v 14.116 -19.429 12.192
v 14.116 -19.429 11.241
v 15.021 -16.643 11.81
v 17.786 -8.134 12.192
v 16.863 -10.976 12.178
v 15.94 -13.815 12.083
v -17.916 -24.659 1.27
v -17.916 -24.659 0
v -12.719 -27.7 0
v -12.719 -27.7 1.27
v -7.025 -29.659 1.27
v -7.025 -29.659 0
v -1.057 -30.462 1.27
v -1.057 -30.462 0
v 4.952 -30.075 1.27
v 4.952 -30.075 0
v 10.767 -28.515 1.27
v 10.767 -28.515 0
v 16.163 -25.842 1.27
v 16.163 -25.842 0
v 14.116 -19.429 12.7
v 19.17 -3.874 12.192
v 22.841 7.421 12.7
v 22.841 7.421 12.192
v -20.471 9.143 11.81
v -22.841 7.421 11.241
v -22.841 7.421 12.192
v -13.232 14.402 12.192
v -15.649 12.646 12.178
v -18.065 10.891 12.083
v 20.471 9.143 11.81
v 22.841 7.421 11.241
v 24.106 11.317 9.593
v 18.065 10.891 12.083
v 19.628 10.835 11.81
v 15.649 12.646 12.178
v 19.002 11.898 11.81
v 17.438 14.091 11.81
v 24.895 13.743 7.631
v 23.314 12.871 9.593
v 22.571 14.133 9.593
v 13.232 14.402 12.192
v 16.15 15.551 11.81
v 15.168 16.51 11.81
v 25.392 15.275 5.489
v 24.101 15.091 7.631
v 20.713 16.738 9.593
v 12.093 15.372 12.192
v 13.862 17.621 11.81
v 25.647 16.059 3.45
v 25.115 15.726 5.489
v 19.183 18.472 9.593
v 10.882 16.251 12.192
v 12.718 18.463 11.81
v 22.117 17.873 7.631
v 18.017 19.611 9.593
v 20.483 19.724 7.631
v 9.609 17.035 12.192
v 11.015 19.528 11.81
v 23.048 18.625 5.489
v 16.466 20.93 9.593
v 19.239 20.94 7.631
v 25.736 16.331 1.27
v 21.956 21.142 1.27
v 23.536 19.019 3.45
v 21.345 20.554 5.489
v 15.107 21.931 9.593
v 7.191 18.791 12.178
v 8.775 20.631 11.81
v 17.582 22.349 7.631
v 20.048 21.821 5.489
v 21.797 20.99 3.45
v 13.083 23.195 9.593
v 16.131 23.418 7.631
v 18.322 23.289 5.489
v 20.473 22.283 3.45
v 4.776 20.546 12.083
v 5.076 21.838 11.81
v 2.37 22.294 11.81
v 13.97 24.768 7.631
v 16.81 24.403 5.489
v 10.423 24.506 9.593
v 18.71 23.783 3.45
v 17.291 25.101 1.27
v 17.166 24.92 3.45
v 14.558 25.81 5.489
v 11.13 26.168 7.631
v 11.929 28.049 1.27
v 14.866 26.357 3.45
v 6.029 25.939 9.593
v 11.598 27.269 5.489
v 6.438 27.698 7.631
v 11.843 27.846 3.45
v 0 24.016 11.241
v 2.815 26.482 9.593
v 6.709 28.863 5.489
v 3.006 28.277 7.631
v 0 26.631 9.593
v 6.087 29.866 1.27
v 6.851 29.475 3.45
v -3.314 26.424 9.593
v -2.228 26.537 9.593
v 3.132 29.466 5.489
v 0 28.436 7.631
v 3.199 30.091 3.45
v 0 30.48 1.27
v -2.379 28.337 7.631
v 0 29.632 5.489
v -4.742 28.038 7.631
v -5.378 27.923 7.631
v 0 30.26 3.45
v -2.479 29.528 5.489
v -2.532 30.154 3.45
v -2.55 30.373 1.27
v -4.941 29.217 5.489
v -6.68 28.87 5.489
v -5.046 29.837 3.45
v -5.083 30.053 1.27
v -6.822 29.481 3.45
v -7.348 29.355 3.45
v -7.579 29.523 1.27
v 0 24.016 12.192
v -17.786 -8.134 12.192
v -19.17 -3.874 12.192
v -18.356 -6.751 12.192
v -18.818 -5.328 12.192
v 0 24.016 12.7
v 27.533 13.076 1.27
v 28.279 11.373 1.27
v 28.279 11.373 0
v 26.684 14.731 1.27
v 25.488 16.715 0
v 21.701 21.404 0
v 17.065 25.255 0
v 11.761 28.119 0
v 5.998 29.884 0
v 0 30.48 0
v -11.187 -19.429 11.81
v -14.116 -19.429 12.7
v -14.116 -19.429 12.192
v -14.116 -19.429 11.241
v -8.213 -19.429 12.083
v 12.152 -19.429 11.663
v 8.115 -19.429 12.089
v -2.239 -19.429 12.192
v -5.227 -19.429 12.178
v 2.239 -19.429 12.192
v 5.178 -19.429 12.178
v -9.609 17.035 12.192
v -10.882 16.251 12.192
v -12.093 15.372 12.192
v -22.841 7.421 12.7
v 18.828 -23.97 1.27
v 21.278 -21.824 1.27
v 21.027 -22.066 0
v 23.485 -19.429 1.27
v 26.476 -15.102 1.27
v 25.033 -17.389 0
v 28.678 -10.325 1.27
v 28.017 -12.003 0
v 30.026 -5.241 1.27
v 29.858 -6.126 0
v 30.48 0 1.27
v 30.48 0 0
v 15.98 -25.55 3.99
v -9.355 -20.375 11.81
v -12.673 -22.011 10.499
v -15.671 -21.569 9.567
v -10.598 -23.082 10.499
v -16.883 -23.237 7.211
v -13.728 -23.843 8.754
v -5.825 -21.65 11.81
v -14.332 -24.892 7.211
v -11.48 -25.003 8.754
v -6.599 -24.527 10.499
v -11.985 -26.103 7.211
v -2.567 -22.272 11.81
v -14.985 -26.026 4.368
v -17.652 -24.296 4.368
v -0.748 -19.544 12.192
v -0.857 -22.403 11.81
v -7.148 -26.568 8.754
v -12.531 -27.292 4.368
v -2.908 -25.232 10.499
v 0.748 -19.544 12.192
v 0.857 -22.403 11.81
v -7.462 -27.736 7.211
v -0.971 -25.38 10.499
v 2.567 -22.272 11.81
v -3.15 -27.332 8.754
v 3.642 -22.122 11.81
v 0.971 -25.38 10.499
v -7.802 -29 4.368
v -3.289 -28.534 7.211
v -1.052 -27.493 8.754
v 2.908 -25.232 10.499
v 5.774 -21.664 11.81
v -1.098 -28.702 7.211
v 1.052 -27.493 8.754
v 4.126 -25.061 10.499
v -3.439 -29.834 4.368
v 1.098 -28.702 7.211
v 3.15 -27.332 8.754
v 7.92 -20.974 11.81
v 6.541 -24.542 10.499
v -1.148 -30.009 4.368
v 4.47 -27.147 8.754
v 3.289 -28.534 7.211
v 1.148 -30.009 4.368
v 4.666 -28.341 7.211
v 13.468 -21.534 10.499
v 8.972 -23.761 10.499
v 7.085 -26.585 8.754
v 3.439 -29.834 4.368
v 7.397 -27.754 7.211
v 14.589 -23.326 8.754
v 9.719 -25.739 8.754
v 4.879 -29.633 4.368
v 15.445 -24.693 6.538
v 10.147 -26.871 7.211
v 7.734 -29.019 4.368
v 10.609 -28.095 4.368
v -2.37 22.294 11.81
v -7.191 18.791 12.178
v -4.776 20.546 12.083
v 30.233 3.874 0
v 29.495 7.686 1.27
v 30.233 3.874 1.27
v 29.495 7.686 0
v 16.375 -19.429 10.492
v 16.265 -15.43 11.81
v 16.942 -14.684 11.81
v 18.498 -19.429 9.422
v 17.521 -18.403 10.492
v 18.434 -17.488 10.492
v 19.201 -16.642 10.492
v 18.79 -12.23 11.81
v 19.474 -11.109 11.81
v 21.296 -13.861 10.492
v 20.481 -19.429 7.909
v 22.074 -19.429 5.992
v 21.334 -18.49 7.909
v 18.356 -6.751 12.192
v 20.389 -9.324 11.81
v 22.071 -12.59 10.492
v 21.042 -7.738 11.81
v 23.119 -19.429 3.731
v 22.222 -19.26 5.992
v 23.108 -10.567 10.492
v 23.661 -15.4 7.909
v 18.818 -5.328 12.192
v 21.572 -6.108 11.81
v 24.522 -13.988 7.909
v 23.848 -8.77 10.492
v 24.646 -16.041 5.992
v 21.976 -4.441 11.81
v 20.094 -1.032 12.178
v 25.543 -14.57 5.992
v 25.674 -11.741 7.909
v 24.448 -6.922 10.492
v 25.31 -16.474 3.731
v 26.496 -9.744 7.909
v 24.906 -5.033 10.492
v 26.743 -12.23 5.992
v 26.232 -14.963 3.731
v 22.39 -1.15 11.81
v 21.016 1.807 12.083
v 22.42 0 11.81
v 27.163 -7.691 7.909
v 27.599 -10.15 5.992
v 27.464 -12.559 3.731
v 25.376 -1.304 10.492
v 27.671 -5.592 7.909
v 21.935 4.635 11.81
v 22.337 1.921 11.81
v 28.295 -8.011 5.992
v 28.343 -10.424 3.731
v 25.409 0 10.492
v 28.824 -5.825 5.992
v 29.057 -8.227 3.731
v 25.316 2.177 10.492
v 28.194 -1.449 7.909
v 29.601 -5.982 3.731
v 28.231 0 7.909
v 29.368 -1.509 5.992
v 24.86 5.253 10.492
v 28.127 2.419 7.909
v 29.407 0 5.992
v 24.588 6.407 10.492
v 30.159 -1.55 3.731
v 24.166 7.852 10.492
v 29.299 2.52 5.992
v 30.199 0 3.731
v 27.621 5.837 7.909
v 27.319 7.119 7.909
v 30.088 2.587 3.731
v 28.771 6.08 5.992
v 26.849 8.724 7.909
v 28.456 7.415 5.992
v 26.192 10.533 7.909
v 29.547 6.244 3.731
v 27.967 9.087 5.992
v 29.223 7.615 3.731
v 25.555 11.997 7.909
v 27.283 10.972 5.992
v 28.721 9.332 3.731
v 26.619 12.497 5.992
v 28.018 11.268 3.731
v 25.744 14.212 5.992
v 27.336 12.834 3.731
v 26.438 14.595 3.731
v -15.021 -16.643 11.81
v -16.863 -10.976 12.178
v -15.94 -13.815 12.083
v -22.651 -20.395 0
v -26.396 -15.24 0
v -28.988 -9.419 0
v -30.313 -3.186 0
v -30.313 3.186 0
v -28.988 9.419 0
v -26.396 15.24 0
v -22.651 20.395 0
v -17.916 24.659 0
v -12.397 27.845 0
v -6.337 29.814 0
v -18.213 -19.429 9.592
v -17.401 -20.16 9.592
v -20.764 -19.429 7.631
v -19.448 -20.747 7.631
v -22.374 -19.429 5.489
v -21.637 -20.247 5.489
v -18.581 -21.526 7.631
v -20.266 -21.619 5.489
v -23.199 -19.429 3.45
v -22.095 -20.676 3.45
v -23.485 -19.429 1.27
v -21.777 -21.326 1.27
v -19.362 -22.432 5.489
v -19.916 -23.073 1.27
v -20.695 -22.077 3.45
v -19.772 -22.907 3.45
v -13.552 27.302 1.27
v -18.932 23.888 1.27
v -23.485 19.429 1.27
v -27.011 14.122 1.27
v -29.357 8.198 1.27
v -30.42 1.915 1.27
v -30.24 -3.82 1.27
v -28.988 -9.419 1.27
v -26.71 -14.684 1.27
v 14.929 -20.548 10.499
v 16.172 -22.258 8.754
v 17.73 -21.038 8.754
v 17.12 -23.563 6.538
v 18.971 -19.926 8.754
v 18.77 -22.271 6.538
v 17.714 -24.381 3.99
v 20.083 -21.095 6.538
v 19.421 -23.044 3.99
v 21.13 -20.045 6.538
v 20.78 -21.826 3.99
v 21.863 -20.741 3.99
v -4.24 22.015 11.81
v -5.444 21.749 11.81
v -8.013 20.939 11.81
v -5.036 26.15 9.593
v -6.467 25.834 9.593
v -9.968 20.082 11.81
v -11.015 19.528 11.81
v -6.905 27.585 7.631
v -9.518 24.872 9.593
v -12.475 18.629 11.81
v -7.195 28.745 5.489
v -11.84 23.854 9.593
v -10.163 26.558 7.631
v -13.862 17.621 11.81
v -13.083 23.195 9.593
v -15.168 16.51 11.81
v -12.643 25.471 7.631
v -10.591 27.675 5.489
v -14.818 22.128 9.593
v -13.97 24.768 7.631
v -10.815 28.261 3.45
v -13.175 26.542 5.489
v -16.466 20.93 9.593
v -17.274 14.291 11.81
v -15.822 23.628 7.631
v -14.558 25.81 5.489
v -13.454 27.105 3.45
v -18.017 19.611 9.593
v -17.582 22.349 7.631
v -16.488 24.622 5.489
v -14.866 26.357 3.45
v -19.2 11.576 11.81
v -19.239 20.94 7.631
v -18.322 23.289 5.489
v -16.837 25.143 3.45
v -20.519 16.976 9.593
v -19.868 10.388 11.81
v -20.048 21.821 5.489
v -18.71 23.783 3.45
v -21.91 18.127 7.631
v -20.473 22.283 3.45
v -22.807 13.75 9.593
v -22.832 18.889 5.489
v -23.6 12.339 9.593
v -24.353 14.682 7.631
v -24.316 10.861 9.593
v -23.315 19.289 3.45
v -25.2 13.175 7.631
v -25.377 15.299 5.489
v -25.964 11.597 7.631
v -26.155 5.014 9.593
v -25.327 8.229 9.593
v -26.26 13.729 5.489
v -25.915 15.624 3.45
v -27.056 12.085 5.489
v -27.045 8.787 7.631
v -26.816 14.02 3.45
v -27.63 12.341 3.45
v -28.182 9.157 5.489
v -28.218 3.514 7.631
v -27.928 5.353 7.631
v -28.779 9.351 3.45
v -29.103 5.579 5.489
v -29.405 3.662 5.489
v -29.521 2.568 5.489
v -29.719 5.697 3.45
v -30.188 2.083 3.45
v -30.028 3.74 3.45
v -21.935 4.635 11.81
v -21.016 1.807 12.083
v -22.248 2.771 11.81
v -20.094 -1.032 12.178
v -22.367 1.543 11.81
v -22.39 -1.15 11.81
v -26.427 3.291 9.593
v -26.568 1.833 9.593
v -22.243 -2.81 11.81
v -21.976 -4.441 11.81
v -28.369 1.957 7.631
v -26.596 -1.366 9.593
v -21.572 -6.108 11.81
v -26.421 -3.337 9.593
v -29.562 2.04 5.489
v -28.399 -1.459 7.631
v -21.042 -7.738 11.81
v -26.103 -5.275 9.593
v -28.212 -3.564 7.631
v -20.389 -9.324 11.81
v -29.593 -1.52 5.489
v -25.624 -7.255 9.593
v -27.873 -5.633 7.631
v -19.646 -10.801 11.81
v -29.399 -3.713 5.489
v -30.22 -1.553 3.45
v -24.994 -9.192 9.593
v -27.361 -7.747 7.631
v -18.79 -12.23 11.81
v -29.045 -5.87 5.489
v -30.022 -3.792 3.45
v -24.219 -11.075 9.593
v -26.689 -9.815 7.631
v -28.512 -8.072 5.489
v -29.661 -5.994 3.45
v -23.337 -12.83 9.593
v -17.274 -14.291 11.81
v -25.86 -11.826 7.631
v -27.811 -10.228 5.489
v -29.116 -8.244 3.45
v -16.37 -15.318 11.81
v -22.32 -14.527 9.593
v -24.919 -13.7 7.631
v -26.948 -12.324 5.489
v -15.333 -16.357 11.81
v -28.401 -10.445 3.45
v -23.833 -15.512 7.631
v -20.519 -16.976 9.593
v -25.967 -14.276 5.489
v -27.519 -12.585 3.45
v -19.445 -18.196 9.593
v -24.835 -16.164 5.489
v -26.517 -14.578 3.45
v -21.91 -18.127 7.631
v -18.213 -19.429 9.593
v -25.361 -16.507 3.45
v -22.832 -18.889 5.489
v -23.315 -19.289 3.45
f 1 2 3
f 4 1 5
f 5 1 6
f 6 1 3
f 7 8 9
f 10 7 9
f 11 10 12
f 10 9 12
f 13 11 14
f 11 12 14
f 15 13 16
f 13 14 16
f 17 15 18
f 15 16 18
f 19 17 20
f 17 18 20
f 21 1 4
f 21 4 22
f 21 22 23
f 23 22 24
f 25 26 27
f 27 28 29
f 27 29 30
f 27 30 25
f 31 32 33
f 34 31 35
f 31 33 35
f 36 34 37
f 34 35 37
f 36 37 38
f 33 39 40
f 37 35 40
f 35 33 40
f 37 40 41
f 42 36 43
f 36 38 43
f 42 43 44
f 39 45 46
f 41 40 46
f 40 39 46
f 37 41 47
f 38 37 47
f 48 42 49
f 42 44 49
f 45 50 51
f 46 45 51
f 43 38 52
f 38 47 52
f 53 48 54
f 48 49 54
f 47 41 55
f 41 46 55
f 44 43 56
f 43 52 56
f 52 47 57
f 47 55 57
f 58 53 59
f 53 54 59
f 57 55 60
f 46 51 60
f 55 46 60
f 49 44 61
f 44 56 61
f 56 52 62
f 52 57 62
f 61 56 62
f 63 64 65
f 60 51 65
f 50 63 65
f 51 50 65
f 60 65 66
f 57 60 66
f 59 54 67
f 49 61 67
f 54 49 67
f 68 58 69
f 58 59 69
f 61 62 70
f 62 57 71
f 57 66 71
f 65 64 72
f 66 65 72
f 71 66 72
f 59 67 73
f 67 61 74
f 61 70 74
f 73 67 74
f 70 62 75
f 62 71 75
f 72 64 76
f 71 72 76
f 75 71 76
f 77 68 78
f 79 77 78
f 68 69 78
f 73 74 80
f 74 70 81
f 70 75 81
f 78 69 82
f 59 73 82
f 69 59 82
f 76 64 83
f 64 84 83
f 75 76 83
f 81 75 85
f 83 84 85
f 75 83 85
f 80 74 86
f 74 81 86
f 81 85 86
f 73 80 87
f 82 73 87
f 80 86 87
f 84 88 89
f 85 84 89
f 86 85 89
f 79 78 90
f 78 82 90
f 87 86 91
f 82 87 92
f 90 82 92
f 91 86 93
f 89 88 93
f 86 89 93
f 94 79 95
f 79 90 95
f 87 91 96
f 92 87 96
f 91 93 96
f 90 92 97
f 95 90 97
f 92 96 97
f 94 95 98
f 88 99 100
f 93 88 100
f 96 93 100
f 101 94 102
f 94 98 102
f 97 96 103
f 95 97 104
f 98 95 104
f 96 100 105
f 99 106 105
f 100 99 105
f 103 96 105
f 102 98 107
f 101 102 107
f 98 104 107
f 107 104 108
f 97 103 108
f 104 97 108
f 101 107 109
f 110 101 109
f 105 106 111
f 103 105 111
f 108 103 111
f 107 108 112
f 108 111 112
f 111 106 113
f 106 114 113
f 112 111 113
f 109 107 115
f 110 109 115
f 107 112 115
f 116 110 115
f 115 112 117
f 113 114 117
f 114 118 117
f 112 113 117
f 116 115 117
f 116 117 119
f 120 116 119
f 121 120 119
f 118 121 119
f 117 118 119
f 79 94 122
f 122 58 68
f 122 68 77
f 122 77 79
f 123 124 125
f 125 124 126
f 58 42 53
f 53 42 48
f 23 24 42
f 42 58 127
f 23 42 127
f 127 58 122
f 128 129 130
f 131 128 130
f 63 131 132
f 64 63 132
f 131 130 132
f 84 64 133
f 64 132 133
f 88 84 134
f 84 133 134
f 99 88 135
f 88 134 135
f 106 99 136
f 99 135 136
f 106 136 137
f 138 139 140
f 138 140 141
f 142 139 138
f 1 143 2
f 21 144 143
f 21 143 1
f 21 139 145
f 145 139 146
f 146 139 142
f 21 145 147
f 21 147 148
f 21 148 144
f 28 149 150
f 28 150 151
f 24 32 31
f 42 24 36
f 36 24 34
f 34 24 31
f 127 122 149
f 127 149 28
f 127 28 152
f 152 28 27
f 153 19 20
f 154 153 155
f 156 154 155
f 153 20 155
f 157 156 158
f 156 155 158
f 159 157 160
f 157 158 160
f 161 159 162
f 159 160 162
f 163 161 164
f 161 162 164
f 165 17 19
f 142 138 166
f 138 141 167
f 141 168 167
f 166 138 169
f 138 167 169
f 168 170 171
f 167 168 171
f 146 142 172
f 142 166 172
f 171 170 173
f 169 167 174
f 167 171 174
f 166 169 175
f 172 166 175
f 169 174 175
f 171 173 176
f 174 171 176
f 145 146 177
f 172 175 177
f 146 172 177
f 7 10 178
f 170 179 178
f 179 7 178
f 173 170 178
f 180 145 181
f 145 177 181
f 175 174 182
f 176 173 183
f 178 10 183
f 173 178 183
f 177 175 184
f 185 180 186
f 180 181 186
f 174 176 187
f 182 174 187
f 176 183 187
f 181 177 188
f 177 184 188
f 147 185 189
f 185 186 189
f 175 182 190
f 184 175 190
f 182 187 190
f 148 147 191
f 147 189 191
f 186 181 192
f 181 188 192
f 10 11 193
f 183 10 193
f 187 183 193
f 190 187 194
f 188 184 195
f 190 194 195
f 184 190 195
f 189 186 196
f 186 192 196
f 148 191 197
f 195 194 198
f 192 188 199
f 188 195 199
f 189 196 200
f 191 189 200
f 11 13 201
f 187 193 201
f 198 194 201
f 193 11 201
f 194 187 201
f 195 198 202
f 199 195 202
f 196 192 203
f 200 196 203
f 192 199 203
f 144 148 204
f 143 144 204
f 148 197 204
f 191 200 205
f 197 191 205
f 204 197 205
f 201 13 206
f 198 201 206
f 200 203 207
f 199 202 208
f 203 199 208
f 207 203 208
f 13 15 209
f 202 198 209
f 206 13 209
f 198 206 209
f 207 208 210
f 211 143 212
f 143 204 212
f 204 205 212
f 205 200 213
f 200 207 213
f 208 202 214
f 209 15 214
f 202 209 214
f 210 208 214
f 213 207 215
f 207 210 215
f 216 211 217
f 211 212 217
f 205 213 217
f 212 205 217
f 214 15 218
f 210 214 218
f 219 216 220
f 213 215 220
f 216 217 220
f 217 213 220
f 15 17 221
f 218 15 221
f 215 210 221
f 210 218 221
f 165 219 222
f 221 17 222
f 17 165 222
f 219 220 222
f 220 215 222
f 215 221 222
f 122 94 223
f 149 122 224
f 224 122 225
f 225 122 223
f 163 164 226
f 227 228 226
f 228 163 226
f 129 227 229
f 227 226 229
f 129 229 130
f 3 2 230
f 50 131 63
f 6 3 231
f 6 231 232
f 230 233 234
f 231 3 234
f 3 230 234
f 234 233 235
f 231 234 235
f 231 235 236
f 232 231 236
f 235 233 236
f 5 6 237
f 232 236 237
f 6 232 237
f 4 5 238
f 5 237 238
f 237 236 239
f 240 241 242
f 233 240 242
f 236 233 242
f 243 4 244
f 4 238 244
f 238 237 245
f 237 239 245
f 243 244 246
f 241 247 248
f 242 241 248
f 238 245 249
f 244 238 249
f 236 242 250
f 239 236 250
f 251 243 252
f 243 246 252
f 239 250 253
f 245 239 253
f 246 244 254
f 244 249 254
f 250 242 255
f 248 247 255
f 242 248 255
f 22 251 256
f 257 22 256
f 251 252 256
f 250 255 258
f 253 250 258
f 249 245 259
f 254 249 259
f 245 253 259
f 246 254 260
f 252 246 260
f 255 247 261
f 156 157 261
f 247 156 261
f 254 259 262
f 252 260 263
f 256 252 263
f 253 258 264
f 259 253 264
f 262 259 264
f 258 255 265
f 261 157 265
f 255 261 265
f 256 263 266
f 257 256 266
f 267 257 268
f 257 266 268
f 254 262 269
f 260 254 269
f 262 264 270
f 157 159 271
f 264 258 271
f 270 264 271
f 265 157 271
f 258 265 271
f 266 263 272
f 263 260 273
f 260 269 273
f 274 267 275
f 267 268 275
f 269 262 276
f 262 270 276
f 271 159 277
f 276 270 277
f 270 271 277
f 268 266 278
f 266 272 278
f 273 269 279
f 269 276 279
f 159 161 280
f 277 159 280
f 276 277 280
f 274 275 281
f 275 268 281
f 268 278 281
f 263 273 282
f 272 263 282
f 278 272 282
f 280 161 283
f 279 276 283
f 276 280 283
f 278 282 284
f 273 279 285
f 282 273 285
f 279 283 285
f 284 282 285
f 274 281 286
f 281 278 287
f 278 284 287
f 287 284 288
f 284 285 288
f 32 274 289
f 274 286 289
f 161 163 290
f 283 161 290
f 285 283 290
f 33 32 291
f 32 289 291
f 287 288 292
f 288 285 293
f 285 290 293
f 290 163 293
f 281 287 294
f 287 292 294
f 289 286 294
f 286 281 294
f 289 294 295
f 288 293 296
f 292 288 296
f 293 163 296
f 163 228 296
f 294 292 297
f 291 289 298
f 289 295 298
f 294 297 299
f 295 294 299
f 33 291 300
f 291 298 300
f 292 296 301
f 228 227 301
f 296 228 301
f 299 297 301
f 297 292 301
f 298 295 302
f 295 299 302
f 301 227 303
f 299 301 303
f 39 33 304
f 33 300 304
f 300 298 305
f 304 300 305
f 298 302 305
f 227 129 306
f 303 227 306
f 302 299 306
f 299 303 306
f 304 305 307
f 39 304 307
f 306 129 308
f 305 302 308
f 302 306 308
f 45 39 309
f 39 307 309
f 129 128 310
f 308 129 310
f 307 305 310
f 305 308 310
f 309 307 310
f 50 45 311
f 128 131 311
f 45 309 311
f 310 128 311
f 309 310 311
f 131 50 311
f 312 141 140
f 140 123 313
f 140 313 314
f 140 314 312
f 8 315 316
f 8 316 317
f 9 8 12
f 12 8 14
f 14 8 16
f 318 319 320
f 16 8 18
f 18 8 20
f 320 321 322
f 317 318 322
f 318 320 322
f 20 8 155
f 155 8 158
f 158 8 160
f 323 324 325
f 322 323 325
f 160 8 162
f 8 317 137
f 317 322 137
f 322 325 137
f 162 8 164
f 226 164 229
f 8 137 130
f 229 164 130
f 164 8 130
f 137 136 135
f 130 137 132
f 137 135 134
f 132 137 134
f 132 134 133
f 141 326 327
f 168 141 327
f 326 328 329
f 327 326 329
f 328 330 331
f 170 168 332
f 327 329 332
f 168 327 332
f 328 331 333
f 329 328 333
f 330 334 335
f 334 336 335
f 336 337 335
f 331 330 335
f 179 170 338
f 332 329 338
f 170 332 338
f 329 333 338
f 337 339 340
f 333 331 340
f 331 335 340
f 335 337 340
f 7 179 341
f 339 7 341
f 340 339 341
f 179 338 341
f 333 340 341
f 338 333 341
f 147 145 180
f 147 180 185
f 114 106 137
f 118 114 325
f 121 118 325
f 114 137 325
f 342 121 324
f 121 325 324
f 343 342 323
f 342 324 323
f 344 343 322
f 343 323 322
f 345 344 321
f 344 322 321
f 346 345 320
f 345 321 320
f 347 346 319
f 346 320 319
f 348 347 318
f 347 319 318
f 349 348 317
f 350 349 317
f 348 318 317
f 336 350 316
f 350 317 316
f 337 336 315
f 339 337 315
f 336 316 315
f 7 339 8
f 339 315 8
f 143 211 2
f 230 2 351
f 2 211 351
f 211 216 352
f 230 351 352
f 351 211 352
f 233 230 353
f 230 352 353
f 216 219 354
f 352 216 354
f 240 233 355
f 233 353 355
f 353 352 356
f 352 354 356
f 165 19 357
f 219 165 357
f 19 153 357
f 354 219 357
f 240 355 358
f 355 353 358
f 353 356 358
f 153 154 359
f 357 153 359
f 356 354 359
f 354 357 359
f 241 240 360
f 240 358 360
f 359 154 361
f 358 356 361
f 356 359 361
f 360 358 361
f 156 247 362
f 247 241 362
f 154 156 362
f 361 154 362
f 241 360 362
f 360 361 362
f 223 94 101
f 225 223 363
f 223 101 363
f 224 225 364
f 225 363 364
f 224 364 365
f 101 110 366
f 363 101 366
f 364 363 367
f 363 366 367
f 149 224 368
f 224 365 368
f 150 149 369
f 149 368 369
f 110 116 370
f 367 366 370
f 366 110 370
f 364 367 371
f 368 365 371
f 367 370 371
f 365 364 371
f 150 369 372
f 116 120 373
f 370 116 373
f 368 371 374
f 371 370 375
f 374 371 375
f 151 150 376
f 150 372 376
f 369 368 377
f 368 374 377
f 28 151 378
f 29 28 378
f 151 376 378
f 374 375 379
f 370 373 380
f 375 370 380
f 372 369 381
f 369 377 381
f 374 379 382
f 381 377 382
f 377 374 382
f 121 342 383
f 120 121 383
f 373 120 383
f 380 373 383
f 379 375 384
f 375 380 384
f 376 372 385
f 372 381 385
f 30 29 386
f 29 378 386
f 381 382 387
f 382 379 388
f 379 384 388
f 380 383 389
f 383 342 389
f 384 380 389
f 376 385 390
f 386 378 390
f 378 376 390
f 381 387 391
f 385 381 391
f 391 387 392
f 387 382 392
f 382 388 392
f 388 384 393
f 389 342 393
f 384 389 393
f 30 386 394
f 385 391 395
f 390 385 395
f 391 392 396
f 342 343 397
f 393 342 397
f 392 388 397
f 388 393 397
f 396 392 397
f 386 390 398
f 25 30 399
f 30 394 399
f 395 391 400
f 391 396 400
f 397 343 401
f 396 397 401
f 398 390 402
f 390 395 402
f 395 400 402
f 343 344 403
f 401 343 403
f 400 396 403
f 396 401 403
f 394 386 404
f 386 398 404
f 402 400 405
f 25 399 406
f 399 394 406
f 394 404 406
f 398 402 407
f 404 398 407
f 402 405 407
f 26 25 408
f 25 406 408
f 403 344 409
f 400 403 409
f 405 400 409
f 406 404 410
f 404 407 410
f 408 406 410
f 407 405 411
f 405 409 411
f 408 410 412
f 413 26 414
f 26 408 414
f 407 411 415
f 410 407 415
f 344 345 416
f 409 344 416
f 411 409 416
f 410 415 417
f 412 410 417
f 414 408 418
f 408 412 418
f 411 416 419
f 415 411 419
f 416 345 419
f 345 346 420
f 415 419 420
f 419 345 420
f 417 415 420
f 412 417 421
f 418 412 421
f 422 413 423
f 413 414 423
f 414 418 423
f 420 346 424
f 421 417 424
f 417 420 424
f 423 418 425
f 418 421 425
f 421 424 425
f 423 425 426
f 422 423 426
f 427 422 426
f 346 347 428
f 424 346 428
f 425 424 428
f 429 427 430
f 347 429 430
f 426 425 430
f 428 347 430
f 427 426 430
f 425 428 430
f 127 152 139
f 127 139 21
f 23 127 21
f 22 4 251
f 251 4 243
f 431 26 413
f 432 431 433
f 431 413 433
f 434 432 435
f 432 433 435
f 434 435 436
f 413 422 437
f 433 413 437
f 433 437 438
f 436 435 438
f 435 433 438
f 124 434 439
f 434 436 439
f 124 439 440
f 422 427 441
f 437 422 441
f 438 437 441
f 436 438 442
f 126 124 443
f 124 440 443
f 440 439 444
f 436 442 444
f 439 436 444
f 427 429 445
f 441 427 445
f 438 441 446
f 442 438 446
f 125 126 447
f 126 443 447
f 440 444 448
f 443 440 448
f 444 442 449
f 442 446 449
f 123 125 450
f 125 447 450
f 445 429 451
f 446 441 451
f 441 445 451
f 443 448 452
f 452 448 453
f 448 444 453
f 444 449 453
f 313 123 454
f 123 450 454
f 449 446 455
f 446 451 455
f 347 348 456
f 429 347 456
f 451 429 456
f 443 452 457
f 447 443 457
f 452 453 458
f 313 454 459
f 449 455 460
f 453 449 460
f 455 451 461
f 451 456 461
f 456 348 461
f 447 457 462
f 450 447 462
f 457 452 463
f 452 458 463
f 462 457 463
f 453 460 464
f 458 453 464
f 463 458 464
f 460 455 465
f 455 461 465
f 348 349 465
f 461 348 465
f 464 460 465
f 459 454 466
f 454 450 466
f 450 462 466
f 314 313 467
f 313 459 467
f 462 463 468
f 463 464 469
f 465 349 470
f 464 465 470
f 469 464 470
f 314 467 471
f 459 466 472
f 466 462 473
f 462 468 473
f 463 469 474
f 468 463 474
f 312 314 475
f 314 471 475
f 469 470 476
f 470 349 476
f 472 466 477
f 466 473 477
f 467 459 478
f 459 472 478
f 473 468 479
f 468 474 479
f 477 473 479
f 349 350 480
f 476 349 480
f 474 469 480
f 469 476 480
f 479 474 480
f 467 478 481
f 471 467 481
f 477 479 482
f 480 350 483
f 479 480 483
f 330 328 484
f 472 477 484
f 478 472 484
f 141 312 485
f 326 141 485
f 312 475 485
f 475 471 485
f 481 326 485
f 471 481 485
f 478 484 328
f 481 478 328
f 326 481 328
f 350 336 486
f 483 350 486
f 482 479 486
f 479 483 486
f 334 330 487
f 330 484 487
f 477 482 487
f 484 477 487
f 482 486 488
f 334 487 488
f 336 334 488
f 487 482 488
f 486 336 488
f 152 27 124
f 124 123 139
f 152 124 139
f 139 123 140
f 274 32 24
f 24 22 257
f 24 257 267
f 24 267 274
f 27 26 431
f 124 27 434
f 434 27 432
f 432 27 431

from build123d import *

# Parameters (mm, degrees)
F1_DEPTH     = 12.7
F2_DEPTH     = 12.192
F3_DEPTH     = 12.192
F4_DEPTH     = 12.192
F5_DEPTH     = 12.192
F6_DEPTH     = 12.192
F7_T4_ANGLE  = 291.9758344639
F7_T9_ANGLE  = 291.9758344639
F7_T14_ANGLE = 291.9758344639
F7_T19_ANGLE = 291.9758344639
F7_T24_ANGLE = 291.9758344639
F7_T29_ANGLE = 68.0241655361


# Not quite as in the source:
# - a fillet or chamfer that OpenCascade refuses, or shapes differently, is made with other operations: its cross-section is extruded or revolved along the edge and cut away or added


with BuildPart() as f1:
    # F0 (on Top) → F1 (new body)
    with BuildSketch(Plane.XY):
        Polygon((0, 24.0160203306), (-22.8405926309, 7.4213584194), (-14.1162625691, -19.4293685847), (14.1162625691, -19.4293685847), (22.8405926309, 7.4213584194), align=None)
    extrude(amount=F1_DEPTH)

    # F0 (on Top) → F2 (join)
    with BuildSketch(Plane.XY):
        with BuildLine():
            Line((-14.1162625691, -19.4293685847), (-22.8405926309, 7.4213584194))
            Line((-22.8405926309, 7.4213584194), (-28.2653771262, 11.4060885458))
            ThreePointArc((-28.2653771262, 11.4060885458), (-29.2974841135, -8.4076051653), (-17.9156944899, -24.6588379885))
            Line((-17.9156944899, -24.6588379885), (-14.1162625691, -19.4293685847))
        make_face()
    extrude(amount=F2_DEPTH)

    # F0 (on Top) → F3 (join)
    with BuildSketch(Plane.XY):
        with BuildLine():
            Line((-28.2653771262, 11.4060885458), (-22.8405926309, 7.4213584194))
            Line((-22.8405926309, 7.4213584194), (0, 24.0160203306))
            Line((0, 24.0160203306), (0, 30.48))
            ThreePointArc((0, 30.48), (-17.0495281625, 25.2654702992), (-28.2653771262, 11.4060885458))
        make_face()
    extrude(amount=F3_DEPTH)

    # F0 (on Top) → F4 (join)
    with BuildSketch(Plane.XY):
        with BuildLine():
            Line((0, 30.48), (0, 24.0160203306))
            Line((0, 24.0160203306), (22.8405926309, 7.4213584194))
            Line((22.8405926309, 7.4213584194), (28.2789000487, 11.3725200388))
            ThreePointArc((28.2789000487, 11.3725200388), (17.0645244472, 25.2553440957), (0, 30.48))
        make_face()
    extrude(amount=F4_DEPTH)

    # F0 (on Top) → F5 (join)
    with BuildSketch(Plane.XY):
        with BuildLine():
            Line((28.2789000487, 11.3725200388), (22.8405926309, 7.4213584194))
            Line((22.8405926309, 7.4213584194), (14.1162625691, -19.4293685847))
            Line((14.1162625691, -19.4293685847), (16.162839814, -25.8416912981))
            ThreePointArc((16.162839814, -25.8416912981), (26.6615243144, -14.7713750624), (30.48, 0))
            ThreePointArc((30.48, 0), (29.9246660256, 5.7917841169), (28.2789000487, 11.3725200388))
        make_face()
    extrude(amount=F5_DEPTH)

    # F0 (on Top) → F6 (join)
    with BuildSketch(Plane.XY):
        with BuildLine():
            Line((14.1162625691, -19.4293685847), (-14.1162625691, -19.4293685847))
            Line((-14.1162625691, -19.4293685847), (-17.9156944899, -24.6588379885))
            ThreePointArc((-17.9156944899, -24.6588379885), (-1.0573128046, -30.4616560553), (16.162839814, -25.8416912981))
            Line((16.162839814, -25.8416912981), (14.1162625691, -19.4293685847))
        make_face()
    extrude(amount=F6_DEPTH)

    # F7: fillet of radius 10.922 on 2 edges, made by hand


with BuildPart() as f7_tool2:
    # F7_s3 → F7_t4 (revolve)
    with BuildSketch(Plane(origin=(0, 0, 0), x_dir=(0, 0, 1), z_dir=(-0.8478245177, -0.5302768968, 0))):
        with BuildLine():
            ThreePointArc((12.192, -19.558), (8.9930202641, -27.2810202641), (1.27, -30.48))
            Line((1.27, -30.48), (12.192, -30.48))
            Line((12.192, -30.48), (12.192, -19.558))
        make_face()
    revolve(axis=Axis((0, 0, 12.192), (0, 0, 1)), revolution_arc=F7_T4_ANGLE)

    split(bisect_by=Plane.XZ.offset(19.4293685847), keep=Keep.TOP)


with BuildPart() as f1_1:
    add(f1.part)

    # F7_t1: cut F7_tool2
    add(f7_tool2.part, mode=Mode.SUBTRACT)


with BuildPart() as f7_tool7:
    # F7_s8 → F7_t9 (revolve)
    with BuildSketch(Plane(origin=(0, 0, 0), x_dir=(0, 0, 1), z_dir=(-0.8478245177, -0.5302768968, 0))):
        with BuildLine():
            ThreePointArc((12.192, -19.558), (8.9930202641, -27.2810202641), (1.27, -30.48))
            Line((1.27, -30.48), (12.192, -30.48))
            Line((12.192, -30.48), (12.192, -19.558))
        make_face()
    revolve(axis=Axis((0, 0, 12.192), (0, 0, 1)), revolution_arc=F7_T9_ANGLE)

    split(bisect_by=Plane(origin=(18.4784276, -6.0040050827, 0), x_dir=(0, 0, 1), z_dir=(0.9510565163, -0.3090169944, 0)), keep=Keep.TOP)


with BuildPart() as f1_2:
    add(f1_1.part)

    # F7_t6: cut F7_tool7
    add(f7_tool7.part, mode=Mode.SUBTRACT)


with BuildPart() as f7_tool12:
    # F7_s13 → F7_t14 (revolve)
    with BuildSketch(Plane(origin=(0, 0, 0), x_dir=(0, 0, 1), z_dir=(-0.8478245177, -0.5302768968, 0))):
        with BuildLine():
            ThreePointArc((12.192, -19.558), (8.9930202641, -27.2810202641), (1.27, -30.48))
            Line((1.27, -30.48), (12.192, -30.48))
            Line((12.192, -30.48), (12.192, -19.558))
        make_face()
    revolve(axis=Axis((0, 0, 12.192), (0, 0, 1)), revolution_arc=F7_T14_ANGLE)

    split(bisect_by=Plane(origin=(11.4202963155, 15.718689375, 0), x_dir=(0, 0, 1), z_dir=(0.5877852523, 0.8090169944, 0)), keep=Keep.TOP)


with BuildPart() as f1_3:
    add(f1_2.part)

    # F7_t11: cut F7_tool12
    add(f7_tool12.part, mode=Mode.SUBTRACT)


with BuildPart() as f7_tool17:
    # F7_s18 → F7_t19 (revolve)
    with BuildSketch(Plane(origin=(0, 0, 0), x_dir=(0, 0, 1), z_dir=(-0.8478245177, -0.5302768968, 0))):
        with BuildLine():
            ThreePointArc((12.192, -19.558), (8.9930202641, -27.2810202641), (1.27, -30.48))
            Line((1.27, -30.48), (12.192, -30.48))
            Line((12.192, -30.48), (12.192, -19.558))
        make_face()
    revolve(axis=Axis((0, 0, 12.192), (0, 0, 1)), revolution_arc=F7_T19_ANGLE)

    split(bisect_by=Plane(origin=(-11.4202963155, 15.718689375, 0), x_dir=(0, 0, 1), z_dir=(-0.5877852523, 0.8090169944, 0)), keep=Keep.TOP)


with BuildPart() as f1_4:
    add(f1_3.part)

    # F7_t16: cut F7_tool17
    add(f7_tool17.part, mode=Mode.SUBTRACT)


with BuildPart() as f7_tool22:
    # F7_s23 → F7_t24 (revolve)
    with BuildSketch(Plane(origin=(0, 0, 0), x_dir=(0, 0, 1), z_dir=(-0.8478245177, -0.5302768968, 0))):
        with BuildLine():
            ThreePointArc((12.192, -19.558), (8.9930202641, -27.2810202641), (1.27, -30.48))
            Line((1.27, -30.48), (12.192, -30.48))
            Line((12.192, -30.48), (12.192, -19.558))
        make_face()
    revolve(axis=Axis((0, 0, 12.192), (0, 0, 1)), revolution_arc=F7_T24_ANGLE)

    split(bisect_by=Plane(origin=(-18.4784276, -6.0040050827, 0), x_dir=(0, 0, 1), z_dir=(-0.9510565163, -0.3090169944, 0)), keep=Keep.TOP)


with BuildPart() as f1_5:
    add(f1_4.part)

    # F7_t21: cut F7_tool22
    add(f7_tool22.part, mode=Mode.SUBTRACT)


with BuildPart() as f7_tool27:
    # F7_s28 → F7_t29 (revolve)
    with BuildSketch(Plane(origin=(0, 0, 0), x_dir=(0, 0, 1), z_dir=(-0.8090169944, 0.5877852523, 0))):
        with BuildLine():
            ThreePointArc((12.192, -19.558), (8.9930202641, -27.2810202641), (1.27, -30.48))
            Line((1.27, -30.48), (12.192, -30.48))
            Line((12.192, -30.48), (12.192, -19.558))
        make_face()
    revolve(axis=Axis((0, 0, 12.192), (0, 0, 1)), revolution_arc=F7_T29_ANGLE)

    split(bisect_by=Plane.XZ.offset(19.4293685847), keep=Keep.TOP)


with BuildPart() as f1_6:
    add(f1_5.part)

    # F7_t26: cut F7_tool27
    add(f7_tool27.part, mode=Mode.SUBTRACT)


solid = f1_6.part
